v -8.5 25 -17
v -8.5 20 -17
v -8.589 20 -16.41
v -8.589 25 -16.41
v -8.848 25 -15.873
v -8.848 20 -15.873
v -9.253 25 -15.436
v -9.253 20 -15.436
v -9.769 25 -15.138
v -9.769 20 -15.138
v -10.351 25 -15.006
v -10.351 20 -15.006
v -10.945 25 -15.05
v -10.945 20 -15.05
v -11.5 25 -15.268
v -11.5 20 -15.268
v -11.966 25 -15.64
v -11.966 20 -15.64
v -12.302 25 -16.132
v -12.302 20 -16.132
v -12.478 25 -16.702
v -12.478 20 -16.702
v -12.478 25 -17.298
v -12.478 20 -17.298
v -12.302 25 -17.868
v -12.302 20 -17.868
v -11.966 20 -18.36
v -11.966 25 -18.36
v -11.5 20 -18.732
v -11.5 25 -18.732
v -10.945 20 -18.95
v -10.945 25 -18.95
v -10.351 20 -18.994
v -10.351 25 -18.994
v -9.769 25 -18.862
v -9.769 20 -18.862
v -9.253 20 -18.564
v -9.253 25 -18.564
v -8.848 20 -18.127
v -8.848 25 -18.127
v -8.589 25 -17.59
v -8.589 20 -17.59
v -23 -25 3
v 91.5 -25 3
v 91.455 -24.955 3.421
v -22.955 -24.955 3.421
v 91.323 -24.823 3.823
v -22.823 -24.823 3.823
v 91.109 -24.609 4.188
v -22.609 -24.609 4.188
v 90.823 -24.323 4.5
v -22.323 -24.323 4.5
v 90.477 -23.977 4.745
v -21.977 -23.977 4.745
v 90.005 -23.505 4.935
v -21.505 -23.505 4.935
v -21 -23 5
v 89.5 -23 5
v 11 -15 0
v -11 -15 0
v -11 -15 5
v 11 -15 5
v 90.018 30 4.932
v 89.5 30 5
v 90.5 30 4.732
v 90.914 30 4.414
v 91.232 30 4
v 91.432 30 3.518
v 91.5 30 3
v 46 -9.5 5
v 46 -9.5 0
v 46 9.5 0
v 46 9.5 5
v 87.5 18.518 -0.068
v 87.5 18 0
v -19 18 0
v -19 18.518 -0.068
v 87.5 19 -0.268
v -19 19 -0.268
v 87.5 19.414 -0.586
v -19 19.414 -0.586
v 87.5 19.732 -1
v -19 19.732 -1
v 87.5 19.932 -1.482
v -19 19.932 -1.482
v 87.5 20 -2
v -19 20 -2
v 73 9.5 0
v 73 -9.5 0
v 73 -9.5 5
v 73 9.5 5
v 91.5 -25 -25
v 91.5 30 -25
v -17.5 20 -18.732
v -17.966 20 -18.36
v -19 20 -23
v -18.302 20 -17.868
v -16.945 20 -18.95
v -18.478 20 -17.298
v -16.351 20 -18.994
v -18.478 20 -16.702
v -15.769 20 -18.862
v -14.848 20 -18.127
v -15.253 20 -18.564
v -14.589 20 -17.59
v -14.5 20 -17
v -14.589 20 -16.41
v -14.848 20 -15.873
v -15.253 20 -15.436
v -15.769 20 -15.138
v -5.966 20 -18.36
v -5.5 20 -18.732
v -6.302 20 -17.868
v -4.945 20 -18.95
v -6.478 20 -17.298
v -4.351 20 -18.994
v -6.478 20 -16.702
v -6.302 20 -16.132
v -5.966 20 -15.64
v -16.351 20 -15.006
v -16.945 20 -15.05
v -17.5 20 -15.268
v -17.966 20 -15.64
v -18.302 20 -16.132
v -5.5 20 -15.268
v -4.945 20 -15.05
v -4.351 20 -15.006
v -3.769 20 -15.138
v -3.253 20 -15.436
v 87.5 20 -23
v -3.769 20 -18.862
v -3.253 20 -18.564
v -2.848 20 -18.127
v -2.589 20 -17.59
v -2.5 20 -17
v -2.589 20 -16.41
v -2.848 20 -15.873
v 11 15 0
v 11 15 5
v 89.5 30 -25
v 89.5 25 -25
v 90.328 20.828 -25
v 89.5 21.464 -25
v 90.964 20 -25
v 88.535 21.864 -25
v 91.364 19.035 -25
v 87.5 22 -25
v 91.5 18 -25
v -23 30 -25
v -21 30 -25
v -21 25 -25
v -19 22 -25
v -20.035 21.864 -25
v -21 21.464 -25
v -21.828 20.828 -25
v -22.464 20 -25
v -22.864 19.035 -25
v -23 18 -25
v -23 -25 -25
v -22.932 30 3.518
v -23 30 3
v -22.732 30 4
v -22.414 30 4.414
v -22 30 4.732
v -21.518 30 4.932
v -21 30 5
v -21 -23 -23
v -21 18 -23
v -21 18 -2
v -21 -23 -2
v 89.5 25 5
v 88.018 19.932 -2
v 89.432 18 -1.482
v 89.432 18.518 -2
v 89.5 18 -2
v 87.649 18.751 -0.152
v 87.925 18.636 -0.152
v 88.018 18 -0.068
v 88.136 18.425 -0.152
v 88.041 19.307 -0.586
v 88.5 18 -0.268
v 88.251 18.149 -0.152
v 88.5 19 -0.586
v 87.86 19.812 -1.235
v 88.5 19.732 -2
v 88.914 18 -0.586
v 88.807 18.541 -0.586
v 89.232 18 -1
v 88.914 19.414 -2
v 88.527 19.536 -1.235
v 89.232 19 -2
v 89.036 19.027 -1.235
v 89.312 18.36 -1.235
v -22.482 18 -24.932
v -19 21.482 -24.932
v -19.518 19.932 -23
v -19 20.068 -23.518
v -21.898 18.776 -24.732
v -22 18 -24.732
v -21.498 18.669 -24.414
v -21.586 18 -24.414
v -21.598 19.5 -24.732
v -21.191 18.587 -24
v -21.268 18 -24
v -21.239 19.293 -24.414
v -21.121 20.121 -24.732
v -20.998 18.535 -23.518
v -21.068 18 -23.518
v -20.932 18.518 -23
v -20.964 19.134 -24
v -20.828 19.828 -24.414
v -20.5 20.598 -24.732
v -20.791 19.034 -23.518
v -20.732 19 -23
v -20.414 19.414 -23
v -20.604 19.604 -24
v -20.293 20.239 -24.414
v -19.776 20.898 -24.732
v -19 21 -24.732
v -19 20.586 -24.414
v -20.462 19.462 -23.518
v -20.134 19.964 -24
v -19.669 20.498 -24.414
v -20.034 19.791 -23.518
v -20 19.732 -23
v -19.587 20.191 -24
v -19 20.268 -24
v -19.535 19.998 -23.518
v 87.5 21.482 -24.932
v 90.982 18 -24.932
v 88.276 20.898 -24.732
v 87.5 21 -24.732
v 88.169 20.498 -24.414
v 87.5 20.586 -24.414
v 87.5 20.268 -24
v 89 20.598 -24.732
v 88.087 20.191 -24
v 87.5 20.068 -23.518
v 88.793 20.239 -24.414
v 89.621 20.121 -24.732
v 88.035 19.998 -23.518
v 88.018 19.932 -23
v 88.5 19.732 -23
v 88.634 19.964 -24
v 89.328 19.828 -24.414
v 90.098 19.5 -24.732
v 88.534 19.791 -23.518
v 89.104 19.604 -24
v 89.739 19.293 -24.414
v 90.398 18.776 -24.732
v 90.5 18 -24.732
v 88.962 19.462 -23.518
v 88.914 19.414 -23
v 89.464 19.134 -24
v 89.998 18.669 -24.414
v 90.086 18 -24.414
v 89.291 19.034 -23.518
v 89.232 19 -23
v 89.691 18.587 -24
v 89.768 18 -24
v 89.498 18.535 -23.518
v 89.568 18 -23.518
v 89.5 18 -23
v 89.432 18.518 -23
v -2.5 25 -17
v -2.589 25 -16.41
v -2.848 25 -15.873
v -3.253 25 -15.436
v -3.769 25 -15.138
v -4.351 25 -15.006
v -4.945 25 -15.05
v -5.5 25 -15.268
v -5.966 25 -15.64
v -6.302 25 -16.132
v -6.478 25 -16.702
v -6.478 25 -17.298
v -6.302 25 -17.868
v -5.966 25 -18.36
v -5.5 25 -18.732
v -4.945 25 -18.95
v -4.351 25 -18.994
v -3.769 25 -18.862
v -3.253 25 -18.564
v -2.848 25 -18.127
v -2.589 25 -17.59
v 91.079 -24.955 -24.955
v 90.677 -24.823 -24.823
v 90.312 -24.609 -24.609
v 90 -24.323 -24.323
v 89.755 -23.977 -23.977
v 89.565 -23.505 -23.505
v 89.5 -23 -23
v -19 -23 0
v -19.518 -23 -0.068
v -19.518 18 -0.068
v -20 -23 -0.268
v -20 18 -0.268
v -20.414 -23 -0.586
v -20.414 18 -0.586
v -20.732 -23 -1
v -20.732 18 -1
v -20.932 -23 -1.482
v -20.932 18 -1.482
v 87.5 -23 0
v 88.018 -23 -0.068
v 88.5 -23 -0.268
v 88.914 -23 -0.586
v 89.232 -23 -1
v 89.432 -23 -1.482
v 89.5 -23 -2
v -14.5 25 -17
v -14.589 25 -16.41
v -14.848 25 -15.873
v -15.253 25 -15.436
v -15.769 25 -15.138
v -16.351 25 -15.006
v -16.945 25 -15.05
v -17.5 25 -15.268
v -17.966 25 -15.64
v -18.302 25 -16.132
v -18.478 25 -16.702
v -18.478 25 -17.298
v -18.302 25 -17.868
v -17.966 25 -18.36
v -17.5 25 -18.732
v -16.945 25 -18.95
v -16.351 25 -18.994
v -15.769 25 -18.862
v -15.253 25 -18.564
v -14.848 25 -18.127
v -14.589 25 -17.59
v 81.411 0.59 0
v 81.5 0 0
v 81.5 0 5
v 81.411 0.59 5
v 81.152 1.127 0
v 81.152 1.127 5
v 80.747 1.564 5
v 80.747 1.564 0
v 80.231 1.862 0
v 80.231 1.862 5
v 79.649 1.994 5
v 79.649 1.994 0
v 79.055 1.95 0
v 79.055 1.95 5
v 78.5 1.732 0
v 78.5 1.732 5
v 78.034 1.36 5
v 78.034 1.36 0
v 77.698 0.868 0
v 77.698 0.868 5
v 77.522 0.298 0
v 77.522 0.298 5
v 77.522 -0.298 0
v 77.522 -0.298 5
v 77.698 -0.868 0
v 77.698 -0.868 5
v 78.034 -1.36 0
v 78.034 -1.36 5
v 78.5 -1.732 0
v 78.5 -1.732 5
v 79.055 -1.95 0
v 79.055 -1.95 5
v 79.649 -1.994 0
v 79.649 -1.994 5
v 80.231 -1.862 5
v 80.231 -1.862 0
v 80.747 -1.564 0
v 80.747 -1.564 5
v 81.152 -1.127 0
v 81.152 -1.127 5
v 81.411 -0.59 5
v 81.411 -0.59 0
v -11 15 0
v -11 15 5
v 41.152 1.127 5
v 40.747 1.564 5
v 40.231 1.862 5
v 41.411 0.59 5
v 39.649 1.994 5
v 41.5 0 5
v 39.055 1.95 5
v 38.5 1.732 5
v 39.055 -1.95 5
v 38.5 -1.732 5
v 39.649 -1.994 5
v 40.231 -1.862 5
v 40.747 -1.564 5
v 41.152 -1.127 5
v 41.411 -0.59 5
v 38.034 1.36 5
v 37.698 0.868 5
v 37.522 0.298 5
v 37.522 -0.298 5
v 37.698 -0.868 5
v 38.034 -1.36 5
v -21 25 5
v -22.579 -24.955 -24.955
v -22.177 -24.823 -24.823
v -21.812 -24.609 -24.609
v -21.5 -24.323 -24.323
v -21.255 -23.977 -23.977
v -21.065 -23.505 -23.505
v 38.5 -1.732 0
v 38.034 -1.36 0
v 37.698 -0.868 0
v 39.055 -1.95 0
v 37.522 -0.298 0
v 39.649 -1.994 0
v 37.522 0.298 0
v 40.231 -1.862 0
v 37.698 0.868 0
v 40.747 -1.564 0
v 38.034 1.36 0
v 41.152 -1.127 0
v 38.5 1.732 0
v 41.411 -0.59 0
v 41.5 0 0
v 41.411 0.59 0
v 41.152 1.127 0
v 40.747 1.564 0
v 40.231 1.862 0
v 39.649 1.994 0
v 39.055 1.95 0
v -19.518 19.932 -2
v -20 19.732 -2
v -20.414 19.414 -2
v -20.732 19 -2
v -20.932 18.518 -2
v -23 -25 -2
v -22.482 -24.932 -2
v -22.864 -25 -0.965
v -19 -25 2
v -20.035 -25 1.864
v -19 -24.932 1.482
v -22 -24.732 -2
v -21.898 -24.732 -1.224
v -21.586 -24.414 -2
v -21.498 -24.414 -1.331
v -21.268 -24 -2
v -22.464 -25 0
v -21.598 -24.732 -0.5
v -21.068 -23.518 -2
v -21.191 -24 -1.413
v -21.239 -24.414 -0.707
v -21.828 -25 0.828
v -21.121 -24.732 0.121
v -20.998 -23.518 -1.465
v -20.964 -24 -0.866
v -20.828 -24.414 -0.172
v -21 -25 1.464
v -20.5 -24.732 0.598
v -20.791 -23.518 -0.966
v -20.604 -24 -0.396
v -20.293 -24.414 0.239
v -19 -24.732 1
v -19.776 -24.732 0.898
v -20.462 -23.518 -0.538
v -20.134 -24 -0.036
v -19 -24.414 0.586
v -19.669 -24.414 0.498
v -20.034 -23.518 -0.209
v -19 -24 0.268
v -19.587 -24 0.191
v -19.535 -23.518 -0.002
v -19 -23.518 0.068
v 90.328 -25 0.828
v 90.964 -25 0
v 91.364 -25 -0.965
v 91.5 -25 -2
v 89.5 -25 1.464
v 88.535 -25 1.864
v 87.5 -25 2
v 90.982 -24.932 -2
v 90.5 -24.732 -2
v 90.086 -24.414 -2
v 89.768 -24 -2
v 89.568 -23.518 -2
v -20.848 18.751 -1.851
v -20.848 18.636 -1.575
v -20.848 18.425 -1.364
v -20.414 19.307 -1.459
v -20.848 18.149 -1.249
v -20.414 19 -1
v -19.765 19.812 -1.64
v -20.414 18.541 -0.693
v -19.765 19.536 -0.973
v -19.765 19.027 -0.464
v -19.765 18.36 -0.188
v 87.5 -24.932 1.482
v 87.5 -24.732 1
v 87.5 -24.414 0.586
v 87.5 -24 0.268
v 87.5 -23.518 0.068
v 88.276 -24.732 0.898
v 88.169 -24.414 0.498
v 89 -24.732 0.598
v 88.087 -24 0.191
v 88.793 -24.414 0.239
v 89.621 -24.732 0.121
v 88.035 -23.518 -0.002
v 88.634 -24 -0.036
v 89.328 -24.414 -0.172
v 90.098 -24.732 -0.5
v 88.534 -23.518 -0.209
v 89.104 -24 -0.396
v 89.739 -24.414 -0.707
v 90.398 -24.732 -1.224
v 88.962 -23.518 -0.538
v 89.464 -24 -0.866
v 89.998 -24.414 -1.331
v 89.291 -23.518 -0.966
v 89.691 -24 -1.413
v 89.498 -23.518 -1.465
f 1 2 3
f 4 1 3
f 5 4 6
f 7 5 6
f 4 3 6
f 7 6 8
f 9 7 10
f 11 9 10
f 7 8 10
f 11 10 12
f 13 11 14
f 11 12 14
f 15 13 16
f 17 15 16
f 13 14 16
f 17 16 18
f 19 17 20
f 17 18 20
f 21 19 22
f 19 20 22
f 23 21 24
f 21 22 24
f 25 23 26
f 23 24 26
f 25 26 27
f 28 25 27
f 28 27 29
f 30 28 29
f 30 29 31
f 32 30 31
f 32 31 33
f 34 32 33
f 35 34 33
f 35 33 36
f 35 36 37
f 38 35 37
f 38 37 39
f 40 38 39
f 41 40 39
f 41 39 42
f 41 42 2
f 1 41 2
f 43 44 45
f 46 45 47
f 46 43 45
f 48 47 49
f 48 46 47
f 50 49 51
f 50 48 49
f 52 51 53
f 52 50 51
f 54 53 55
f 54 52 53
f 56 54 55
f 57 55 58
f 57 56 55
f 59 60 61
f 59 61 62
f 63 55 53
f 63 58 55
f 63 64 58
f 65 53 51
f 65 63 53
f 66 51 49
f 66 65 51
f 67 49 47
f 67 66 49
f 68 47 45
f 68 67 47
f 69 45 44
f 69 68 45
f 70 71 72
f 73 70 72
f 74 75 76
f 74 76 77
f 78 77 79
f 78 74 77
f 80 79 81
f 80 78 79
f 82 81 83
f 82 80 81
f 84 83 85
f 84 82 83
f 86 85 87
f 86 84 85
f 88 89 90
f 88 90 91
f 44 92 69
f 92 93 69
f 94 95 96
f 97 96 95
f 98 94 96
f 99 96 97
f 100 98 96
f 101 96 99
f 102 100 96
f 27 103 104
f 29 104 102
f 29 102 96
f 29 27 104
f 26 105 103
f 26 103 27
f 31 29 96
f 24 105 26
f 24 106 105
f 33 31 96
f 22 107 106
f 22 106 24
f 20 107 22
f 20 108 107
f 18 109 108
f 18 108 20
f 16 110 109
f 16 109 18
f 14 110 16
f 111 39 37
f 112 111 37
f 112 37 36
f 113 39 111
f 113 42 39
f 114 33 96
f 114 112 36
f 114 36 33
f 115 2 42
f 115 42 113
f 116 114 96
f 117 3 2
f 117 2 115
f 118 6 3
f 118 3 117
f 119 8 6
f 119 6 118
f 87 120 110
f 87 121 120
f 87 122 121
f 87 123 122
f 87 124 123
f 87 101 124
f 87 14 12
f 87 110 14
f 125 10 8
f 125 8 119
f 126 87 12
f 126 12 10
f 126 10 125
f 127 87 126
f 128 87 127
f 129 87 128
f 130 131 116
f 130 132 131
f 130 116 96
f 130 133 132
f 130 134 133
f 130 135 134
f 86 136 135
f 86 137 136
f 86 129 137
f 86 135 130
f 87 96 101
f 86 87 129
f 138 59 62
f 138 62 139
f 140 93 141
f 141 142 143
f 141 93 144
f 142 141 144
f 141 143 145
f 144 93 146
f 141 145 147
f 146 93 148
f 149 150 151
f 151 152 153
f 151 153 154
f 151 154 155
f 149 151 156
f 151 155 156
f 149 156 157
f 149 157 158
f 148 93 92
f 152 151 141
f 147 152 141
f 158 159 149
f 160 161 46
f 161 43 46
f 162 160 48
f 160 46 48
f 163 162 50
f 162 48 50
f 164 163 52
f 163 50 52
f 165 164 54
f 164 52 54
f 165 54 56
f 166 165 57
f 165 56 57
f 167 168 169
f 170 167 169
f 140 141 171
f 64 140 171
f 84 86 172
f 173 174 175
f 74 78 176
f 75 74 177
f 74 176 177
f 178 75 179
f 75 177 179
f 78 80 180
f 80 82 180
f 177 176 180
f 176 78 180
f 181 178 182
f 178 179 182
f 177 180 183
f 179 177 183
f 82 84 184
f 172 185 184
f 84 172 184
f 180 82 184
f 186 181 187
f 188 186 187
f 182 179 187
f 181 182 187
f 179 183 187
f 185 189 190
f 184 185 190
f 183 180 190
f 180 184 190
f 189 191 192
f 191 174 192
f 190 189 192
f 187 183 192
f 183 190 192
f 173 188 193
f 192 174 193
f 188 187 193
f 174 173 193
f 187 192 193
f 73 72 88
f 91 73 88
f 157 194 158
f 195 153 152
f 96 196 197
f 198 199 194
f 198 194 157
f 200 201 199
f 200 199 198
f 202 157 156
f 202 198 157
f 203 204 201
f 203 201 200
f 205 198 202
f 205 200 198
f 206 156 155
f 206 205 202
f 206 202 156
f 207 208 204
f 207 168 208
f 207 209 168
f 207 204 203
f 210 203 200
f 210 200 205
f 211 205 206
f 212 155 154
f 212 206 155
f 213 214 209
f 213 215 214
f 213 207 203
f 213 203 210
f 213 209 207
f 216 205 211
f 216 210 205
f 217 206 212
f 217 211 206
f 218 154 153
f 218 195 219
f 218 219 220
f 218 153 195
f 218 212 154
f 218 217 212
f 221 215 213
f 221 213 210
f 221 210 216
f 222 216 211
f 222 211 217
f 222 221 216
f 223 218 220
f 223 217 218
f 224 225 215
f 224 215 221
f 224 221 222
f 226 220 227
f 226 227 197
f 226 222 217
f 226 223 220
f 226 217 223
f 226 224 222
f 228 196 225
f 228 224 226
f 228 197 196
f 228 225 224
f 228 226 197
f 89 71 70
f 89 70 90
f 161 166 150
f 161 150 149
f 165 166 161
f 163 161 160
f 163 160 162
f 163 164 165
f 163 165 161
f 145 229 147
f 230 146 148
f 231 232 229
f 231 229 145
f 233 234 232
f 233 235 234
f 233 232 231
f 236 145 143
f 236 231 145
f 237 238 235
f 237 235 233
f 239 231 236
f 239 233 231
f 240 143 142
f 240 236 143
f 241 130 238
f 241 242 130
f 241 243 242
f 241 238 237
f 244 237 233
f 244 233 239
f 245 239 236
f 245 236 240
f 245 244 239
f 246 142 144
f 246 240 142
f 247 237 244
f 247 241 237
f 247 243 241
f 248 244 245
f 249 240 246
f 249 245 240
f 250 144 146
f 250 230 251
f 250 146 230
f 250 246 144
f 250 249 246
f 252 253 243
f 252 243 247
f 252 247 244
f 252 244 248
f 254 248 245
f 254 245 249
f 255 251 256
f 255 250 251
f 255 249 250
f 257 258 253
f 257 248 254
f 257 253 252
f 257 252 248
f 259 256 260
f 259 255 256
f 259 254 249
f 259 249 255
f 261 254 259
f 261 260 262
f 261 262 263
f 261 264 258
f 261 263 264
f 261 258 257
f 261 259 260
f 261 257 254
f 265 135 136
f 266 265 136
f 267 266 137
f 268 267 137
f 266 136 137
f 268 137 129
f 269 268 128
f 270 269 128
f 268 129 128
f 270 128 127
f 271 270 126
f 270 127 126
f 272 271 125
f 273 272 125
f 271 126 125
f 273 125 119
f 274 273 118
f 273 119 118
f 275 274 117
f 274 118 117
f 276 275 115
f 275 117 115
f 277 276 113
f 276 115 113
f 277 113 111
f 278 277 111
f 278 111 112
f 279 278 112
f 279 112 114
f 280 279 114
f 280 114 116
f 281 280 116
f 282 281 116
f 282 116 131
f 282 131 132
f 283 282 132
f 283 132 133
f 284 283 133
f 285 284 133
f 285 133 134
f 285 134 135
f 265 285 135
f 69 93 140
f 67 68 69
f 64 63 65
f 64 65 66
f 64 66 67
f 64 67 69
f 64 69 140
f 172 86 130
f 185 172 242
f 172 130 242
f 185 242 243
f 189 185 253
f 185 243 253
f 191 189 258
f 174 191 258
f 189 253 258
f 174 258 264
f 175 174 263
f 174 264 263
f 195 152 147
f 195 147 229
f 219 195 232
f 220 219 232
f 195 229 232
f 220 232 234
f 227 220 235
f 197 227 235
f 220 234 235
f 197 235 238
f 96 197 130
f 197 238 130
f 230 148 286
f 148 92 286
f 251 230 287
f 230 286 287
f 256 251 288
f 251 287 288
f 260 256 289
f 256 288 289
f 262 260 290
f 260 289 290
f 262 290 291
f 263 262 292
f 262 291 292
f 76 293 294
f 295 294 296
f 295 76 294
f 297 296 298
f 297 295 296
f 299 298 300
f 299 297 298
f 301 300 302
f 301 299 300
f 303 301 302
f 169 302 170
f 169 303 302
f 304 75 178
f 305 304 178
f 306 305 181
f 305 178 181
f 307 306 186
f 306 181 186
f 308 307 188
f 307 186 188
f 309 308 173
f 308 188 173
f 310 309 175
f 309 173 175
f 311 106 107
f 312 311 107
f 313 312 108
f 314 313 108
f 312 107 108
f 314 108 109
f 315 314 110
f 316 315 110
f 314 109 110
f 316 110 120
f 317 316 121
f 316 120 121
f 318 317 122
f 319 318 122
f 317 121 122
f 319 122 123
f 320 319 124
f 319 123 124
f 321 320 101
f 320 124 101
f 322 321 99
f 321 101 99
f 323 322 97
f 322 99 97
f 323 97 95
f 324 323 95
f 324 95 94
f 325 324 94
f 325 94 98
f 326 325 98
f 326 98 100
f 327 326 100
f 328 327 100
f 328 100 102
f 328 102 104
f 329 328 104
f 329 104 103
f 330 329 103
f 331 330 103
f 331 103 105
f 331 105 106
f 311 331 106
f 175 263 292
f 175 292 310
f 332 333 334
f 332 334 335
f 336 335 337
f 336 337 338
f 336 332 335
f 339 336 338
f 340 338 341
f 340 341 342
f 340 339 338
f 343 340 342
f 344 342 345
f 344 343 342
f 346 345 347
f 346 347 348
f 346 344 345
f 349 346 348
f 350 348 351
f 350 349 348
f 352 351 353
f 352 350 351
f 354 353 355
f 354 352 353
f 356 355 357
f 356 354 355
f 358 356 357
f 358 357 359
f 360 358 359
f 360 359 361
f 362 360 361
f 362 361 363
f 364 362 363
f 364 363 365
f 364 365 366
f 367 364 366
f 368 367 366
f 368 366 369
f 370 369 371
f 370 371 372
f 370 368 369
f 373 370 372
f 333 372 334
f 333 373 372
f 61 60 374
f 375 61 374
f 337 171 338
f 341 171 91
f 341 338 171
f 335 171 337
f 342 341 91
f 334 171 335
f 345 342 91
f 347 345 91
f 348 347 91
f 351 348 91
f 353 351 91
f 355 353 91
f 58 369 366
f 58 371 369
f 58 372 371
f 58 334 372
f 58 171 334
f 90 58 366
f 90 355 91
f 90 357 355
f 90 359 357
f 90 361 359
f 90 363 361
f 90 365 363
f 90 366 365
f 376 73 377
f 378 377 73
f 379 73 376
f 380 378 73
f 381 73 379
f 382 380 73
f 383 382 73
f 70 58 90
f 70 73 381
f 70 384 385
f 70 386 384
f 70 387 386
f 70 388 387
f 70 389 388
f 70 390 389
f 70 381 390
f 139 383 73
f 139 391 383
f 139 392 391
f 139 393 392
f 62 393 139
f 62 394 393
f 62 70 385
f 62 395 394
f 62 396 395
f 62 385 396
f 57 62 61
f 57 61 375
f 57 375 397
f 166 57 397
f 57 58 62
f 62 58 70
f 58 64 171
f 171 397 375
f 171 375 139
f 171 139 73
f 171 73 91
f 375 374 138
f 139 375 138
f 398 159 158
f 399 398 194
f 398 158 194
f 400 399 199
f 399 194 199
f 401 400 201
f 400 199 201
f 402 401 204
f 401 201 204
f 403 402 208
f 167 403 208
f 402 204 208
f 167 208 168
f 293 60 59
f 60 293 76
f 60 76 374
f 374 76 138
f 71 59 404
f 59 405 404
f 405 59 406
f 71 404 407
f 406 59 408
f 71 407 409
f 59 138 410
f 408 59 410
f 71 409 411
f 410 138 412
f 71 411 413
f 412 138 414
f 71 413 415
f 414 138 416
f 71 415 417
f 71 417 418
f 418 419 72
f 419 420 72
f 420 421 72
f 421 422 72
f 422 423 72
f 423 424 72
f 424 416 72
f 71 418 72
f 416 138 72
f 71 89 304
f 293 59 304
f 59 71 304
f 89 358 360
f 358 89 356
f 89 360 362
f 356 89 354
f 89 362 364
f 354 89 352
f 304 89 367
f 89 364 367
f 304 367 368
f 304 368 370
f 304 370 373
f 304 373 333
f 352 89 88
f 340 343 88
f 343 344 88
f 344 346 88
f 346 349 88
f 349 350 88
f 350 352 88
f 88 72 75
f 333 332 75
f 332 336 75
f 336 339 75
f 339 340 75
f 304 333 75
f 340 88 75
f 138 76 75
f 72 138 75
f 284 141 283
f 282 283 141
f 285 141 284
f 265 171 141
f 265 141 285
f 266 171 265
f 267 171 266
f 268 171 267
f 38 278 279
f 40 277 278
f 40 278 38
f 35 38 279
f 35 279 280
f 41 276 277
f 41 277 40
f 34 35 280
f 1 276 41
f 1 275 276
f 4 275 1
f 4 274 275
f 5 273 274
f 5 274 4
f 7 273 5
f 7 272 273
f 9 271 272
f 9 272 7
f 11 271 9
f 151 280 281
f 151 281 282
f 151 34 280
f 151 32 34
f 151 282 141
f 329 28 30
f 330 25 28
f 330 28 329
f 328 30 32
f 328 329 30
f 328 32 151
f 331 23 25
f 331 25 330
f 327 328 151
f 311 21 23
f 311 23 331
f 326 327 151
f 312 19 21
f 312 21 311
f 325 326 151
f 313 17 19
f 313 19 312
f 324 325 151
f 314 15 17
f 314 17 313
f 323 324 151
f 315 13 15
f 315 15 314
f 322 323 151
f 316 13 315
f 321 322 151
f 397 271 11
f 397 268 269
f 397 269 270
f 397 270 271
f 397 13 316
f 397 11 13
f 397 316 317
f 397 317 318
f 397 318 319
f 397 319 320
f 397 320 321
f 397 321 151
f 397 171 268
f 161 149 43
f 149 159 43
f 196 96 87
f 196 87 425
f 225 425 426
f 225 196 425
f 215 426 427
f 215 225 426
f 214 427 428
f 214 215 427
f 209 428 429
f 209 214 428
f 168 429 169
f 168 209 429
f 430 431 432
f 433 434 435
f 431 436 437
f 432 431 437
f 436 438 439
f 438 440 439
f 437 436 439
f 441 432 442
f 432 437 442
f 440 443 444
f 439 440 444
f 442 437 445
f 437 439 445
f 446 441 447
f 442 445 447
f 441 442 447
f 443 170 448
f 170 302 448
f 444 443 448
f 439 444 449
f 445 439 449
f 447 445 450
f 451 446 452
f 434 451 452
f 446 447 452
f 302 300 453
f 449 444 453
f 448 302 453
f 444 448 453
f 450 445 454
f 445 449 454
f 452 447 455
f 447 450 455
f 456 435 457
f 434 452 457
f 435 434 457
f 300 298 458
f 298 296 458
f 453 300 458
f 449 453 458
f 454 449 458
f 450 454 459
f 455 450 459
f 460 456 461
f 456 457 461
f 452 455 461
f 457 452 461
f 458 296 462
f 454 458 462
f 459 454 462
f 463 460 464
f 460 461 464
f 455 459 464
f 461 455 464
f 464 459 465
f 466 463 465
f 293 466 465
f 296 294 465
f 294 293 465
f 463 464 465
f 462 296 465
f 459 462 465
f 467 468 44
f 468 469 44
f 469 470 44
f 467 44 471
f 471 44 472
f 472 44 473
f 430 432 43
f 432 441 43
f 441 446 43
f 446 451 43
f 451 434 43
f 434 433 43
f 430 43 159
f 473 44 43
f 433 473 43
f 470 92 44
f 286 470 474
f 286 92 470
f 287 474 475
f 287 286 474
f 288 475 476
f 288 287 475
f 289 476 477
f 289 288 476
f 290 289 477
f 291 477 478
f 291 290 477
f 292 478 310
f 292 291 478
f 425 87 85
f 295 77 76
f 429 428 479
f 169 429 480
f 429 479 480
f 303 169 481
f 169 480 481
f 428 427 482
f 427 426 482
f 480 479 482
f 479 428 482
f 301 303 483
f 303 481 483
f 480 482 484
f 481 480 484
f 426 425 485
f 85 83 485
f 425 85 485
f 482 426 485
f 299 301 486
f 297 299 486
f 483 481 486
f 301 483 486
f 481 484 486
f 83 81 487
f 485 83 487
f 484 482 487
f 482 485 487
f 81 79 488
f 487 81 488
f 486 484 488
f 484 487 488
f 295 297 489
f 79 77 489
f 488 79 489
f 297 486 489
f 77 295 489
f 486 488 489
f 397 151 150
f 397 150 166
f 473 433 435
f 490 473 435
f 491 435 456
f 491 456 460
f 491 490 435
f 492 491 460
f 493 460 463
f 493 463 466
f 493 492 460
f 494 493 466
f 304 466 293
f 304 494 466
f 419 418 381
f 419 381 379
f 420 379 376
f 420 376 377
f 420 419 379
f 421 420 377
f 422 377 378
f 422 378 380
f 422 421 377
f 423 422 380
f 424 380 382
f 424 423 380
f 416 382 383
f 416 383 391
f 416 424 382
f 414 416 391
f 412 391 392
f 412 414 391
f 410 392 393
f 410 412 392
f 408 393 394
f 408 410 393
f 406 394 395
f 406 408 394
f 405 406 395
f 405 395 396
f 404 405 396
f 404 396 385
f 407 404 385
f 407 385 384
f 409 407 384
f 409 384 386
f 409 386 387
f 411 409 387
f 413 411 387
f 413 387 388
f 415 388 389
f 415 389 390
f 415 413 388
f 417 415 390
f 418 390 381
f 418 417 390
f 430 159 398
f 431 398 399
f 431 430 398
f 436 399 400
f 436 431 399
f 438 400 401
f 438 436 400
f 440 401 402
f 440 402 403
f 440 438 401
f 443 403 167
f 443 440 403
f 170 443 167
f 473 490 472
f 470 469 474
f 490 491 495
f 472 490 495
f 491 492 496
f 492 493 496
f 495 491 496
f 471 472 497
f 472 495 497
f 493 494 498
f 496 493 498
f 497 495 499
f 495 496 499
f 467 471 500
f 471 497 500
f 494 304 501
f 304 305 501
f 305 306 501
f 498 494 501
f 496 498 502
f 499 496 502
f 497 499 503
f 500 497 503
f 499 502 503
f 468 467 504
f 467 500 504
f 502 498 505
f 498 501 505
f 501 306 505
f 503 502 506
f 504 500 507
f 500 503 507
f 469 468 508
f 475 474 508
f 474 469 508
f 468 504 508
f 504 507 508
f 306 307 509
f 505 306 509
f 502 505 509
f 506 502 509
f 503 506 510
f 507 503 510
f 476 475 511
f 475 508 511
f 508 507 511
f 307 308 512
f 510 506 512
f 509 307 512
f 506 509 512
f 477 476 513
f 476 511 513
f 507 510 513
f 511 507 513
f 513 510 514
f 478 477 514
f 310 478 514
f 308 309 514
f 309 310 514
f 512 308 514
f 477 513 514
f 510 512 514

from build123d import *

# Parameters (mm, degrees)
F0_W     = 110.5
F0_H     = 50
F0_W_2   = 22
F0_H_2   = 30
F0_R     = 2
F0_W_3   = 27
F0_H_3   = 19
F1_DEPTH = 5
F2_W     = 110.5
F2_H     = 5
F3_DEPTH = 25
F4_R     = 2
F5_DEPTH = 5.001
F6_W     = 2
F6_H     = 30
F7_DEPTH = 50
F8_DEPTH = 5
F9_F1_R  = 2
F9_F2_R  = 1.9999


# Not quite as in the source:
# - a fillet or chamfer is up to 0.001 mm smaller than in the source, because OpenCascade refuses the exact size


with BuildPart() as f1:
    # F0 (on Top) → F1 (new body)
    with BuildSketch(Plane.XY):
        with Locations((34.25, 0)):
            Rectangle(F0_W, F0_H)
        Rectangle(F0_W_2, F0_H_2, mode=Mode.SUBTRACT)
        with Locations((39.5, 0)):
            Circle(F0_R, mode=Mode.SUBTRACT)
        with Locations((59.5, 0)):
            Rectangle(F0_W_3, F0_H_3, mode=Mode.SUBTRACT)
        with Locations((79.5, 0)):
            Circle(F0_R, mode=Mode.SUBTRACT)
    extrude(amount=F1_DEPTH)

    # F2 (on face) → F3 (join)
    with BuildSketch(Plane(origin=(0, 0, 0), x_dir=(1, 0, 0), z_dir=(0, 0, -1))):
        with Locations((34.25, -22.5)):
            Rectangle(F2_W, F2_H)
    extrude(amount=F3_DEPTH)

    # F4 (on face) → F5 (cut, through all)
    with BuildSketch(Plane.XZ.offset(-20)):
        with Locations((-16.5, -17)):
            Circle(F4_R)
        with Locations((-10.5, -17)):
            Circle(F4_R)
        with Locations((-4.5, -17)):
            Circle(F4_R)
    extrude(amount=-F5_DEPTH, mode=Mode.SUBTRACT)

    # F6 (on face) → F7 (join, through all)
    with BuildSketch(Plane(origin=(0, 25, 0), x_dir=(-1, 0, 0), z_dir=(0, 1, 0))):
        with Locations((22, -10)):
            Rectangle(F6_W, F6_H)
        with Locations((-90.5, -10)):
            Rectangle(F6_W, F6_H)
    extrude(amount=-F7_DEPTH)

    # F6 (on face) → F8 (join)
    with BuildSketch(Plane(origin=(0, 25, 0), x_dir=(-1, 0, 0), z_dir=(0, 1, 0))):
        with Locations((22, -10)):
            Rectangle(F6_W, F6_H)
        with Locations((-90.5, -10)):
            Rectangle(F6_W, F6_H)
    extrude(amount=F8_DEPTH)

    # F9: fillet of radius 2 on 10 edges, made by hand

    # F9_f1
    f9_f1_edges = [f1.edges().sort_by_distance(p)[0] for p in [
        (89.5, 20, -12.5),
        (34.25, 20, 0),
        (89.5, -2.5, 0),
        (-21, 20, -12.5),
        (-21, -2.5, 0),
    ]]
    fillet(f9_f1_edges, radius=F9_F1_R)

    # F9_f2 (radius 2 in the source; OpenCascade refuses exactly that, so slightly less here)
    f9_f2_edges = [f1.edges().sort_by_distance(p)[0] for p in [
        (34.25, -25, 0),
        (34.25, -25, 5),
        (89.5, -3.5, -25),
        (-23, 2.5, 5),
        (91.5, 2.5, 5),
        (88.9142135624, 19.4142135624, -25),
        (-20.4142135624, -25, -0.5857864376),
        (88.9142135624, -25, -0.5857864376),
    ]]
    fillet(f9_f2_edges, radius=F9_F2_R)


solid = f1.part
